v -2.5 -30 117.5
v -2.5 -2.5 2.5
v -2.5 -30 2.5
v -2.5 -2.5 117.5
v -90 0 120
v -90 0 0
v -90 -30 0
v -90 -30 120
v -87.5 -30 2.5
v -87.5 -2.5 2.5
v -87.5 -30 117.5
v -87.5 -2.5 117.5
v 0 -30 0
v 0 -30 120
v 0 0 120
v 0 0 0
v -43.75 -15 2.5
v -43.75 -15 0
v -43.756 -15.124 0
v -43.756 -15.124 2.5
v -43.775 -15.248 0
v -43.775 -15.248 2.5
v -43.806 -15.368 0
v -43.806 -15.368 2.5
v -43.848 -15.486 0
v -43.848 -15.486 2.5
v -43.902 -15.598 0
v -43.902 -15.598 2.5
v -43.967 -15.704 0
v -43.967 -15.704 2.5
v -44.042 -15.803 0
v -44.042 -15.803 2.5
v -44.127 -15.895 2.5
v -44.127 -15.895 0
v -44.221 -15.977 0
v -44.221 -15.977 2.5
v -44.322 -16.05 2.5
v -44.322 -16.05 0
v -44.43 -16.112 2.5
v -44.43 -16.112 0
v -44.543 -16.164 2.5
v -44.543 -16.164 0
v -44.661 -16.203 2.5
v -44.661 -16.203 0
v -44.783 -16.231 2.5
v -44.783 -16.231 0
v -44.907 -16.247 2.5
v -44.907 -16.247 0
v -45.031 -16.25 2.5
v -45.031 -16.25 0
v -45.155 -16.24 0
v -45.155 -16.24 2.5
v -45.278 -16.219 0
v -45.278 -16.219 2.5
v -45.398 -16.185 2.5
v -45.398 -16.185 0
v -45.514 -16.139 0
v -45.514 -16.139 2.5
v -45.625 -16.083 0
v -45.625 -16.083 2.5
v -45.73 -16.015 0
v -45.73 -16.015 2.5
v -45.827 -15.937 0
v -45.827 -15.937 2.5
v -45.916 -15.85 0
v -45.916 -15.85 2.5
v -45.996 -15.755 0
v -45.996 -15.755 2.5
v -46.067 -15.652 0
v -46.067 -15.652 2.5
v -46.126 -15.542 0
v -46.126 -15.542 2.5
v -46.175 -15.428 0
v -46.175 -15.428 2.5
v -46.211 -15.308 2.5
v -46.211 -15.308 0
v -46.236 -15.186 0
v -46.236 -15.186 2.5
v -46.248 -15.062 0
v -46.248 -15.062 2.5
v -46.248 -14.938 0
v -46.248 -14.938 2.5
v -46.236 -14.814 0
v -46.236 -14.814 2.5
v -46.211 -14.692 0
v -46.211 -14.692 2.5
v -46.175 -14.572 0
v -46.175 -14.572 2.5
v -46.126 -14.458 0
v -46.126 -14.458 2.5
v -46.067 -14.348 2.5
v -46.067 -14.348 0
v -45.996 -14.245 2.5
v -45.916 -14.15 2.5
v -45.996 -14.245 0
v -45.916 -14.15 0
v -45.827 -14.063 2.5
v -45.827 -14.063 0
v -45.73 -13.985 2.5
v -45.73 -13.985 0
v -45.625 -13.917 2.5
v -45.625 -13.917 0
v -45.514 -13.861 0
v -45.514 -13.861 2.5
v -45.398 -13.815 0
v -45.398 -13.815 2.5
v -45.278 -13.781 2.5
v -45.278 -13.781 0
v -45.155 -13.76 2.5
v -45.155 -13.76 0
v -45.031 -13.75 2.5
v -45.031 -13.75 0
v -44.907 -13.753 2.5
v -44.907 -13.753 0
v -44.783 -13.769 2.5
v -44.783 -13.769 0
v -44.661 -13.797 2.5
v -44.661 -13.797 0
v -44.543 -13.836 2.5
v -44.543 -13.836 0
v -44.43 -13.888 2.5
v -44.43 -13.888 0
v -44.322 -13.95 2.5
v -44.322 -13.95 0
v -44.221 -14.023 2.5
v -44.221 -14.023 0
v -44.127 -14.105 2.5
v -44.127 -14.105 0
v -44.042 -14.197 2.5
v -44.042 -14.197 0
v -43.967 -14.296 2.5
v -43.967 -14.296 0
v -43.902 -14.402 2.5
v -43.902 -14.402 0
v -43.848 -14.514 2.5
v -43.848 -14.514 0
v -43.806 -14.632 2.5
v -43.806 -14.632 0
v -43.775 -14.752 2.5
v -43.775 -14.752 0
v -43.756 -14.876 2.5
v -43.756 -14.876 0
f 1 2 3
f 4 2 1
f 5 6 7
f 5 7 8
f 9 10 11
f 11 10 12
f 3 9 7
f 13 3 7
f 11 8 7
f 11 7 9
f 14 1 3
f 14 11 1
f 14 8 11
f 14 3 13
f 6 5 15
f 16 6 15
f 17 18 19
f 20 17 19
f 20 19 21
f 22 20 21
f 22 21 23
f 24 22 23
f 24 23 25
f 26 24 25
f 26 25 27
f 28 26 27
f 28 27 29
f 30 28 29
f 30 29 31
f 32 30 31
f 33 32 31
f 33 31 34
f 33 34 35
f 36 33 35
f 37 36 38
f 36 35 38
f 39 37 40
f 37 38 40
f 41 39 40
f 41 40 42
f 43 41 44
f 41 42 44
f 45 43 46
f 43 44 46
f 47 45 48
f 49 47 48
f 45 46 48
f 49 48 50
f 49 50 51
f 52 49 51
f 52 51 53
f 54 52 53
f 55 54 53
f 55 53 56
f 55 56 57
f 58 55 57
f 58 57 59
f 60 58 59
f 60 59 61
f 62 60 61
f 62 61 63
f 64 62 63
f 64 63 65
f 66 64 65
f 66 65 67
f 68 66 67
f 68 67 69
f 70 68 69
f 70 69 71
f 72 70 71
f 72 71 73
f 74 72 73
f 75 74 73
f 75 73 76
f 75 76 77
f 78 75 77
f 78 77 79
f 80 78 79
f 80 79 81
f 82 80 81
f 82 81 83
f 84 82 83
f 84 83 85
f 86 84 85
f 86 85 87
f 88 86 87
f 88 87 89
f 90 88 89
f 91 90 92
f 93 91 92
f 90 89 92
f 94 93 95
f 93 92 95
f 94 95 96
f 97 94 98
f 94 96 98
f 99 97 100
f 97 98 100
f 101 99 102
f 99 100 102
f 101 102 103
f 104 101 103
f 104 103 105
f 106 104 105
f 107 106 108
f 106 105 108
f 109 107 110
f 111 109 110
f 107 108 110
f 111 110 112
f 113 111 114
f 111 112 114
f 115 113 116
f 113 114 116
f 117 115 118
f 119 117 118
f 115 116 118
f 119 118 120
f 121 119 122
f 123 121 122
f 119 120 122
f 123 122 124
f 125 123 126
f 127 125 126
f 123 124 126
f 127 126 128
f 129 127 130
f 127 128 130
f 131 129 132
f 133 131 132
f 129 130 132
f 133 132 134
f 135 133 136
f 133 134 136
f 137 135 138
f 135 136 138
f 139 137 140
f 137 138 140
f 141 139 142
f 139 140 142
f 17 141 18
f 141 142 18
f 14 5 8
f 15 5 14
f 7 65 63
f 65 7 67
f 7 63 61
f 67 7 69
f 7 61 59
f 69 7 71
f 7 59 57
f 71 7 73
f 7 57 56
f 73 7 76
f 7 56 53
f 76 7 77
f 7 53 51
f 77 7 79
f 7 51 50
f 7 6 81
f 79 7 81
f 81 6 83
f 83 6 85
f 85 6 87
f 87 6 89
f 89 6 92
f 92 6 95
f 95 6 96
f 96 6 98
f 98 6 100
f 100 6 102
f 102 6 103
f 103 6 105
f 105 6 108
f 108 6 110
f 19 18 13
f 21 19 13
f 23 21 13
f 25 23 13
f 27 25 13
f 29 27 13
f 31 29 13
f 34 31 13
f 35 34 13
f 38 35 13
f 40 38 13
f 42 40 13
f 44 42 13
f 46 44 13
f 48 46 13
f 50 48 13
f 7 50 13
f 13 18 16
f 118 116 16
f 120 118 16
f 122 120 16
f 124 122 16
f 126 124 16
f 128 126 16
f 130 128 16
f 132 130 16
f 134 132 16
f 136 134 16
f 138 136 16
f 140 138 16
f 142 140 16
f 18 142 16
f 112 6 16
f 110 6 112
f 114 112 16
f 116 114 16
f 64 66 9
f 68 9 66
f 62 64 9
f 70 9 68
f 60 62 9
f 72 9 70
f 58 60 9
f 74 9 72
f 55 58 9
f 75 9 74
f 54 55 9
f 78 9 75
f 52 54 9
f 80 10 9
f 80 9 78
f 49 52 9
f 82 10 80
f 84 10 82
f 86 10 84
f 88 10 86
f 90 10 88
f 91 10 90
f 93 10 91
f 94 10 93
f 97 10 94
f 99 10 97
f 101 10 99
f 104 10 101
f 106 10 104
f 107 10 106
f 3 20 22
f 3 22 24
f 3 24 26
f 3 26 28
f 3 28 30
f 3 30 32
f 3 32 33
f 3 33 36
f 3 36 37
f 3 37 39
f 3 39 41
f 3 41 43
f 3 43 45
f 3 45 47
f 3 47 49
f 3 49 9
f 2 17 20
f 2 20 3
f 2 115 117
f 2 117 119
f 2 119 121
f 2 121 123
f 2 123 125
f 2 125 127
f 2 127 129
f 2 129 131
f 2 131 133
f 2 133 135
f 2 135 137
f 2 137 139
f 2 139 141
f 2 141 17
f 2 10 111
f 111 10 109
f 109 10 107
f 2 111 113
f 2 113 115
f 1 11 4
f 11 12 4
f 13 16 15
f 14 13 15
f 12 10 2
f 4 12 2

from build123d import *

# Parameters (mm, degrees)
F0_W     = 90
F0_H     = 120
F1_DEPTH = 30
F2_T     = -2.5
F3_R     = 1.25
F4_DEPTH = 25


with BuildPart() as f1:
    # F0 (on Front) → F1 (new body)
    with BuildSketch(Plane.XZ):
        with Locations((-45, 60)):
            Rectangle(F0_W, F0_H)
    extrude(amount=F1_DEPTH)

    # F2
    f2_openings = [f1.faces().sort_by_distance(p)[0] for p in [
        (-45, -30, 60),
    ]]
    offset(amount=F2_T, openings=f2_openings)

    # F3 (on face) → F4 (cut)
    with BuildSketch(Plane(origin=(0, 0, 0), x_dir=(1, 0, 0), z_dir=(0, 0, -1))):
        with Locations((-45, 15)):
            Circle(F3_R)
    extrude(amount=-F4_DEPTH, mode=Mode.SUBTRACT)


solid = f1.part
